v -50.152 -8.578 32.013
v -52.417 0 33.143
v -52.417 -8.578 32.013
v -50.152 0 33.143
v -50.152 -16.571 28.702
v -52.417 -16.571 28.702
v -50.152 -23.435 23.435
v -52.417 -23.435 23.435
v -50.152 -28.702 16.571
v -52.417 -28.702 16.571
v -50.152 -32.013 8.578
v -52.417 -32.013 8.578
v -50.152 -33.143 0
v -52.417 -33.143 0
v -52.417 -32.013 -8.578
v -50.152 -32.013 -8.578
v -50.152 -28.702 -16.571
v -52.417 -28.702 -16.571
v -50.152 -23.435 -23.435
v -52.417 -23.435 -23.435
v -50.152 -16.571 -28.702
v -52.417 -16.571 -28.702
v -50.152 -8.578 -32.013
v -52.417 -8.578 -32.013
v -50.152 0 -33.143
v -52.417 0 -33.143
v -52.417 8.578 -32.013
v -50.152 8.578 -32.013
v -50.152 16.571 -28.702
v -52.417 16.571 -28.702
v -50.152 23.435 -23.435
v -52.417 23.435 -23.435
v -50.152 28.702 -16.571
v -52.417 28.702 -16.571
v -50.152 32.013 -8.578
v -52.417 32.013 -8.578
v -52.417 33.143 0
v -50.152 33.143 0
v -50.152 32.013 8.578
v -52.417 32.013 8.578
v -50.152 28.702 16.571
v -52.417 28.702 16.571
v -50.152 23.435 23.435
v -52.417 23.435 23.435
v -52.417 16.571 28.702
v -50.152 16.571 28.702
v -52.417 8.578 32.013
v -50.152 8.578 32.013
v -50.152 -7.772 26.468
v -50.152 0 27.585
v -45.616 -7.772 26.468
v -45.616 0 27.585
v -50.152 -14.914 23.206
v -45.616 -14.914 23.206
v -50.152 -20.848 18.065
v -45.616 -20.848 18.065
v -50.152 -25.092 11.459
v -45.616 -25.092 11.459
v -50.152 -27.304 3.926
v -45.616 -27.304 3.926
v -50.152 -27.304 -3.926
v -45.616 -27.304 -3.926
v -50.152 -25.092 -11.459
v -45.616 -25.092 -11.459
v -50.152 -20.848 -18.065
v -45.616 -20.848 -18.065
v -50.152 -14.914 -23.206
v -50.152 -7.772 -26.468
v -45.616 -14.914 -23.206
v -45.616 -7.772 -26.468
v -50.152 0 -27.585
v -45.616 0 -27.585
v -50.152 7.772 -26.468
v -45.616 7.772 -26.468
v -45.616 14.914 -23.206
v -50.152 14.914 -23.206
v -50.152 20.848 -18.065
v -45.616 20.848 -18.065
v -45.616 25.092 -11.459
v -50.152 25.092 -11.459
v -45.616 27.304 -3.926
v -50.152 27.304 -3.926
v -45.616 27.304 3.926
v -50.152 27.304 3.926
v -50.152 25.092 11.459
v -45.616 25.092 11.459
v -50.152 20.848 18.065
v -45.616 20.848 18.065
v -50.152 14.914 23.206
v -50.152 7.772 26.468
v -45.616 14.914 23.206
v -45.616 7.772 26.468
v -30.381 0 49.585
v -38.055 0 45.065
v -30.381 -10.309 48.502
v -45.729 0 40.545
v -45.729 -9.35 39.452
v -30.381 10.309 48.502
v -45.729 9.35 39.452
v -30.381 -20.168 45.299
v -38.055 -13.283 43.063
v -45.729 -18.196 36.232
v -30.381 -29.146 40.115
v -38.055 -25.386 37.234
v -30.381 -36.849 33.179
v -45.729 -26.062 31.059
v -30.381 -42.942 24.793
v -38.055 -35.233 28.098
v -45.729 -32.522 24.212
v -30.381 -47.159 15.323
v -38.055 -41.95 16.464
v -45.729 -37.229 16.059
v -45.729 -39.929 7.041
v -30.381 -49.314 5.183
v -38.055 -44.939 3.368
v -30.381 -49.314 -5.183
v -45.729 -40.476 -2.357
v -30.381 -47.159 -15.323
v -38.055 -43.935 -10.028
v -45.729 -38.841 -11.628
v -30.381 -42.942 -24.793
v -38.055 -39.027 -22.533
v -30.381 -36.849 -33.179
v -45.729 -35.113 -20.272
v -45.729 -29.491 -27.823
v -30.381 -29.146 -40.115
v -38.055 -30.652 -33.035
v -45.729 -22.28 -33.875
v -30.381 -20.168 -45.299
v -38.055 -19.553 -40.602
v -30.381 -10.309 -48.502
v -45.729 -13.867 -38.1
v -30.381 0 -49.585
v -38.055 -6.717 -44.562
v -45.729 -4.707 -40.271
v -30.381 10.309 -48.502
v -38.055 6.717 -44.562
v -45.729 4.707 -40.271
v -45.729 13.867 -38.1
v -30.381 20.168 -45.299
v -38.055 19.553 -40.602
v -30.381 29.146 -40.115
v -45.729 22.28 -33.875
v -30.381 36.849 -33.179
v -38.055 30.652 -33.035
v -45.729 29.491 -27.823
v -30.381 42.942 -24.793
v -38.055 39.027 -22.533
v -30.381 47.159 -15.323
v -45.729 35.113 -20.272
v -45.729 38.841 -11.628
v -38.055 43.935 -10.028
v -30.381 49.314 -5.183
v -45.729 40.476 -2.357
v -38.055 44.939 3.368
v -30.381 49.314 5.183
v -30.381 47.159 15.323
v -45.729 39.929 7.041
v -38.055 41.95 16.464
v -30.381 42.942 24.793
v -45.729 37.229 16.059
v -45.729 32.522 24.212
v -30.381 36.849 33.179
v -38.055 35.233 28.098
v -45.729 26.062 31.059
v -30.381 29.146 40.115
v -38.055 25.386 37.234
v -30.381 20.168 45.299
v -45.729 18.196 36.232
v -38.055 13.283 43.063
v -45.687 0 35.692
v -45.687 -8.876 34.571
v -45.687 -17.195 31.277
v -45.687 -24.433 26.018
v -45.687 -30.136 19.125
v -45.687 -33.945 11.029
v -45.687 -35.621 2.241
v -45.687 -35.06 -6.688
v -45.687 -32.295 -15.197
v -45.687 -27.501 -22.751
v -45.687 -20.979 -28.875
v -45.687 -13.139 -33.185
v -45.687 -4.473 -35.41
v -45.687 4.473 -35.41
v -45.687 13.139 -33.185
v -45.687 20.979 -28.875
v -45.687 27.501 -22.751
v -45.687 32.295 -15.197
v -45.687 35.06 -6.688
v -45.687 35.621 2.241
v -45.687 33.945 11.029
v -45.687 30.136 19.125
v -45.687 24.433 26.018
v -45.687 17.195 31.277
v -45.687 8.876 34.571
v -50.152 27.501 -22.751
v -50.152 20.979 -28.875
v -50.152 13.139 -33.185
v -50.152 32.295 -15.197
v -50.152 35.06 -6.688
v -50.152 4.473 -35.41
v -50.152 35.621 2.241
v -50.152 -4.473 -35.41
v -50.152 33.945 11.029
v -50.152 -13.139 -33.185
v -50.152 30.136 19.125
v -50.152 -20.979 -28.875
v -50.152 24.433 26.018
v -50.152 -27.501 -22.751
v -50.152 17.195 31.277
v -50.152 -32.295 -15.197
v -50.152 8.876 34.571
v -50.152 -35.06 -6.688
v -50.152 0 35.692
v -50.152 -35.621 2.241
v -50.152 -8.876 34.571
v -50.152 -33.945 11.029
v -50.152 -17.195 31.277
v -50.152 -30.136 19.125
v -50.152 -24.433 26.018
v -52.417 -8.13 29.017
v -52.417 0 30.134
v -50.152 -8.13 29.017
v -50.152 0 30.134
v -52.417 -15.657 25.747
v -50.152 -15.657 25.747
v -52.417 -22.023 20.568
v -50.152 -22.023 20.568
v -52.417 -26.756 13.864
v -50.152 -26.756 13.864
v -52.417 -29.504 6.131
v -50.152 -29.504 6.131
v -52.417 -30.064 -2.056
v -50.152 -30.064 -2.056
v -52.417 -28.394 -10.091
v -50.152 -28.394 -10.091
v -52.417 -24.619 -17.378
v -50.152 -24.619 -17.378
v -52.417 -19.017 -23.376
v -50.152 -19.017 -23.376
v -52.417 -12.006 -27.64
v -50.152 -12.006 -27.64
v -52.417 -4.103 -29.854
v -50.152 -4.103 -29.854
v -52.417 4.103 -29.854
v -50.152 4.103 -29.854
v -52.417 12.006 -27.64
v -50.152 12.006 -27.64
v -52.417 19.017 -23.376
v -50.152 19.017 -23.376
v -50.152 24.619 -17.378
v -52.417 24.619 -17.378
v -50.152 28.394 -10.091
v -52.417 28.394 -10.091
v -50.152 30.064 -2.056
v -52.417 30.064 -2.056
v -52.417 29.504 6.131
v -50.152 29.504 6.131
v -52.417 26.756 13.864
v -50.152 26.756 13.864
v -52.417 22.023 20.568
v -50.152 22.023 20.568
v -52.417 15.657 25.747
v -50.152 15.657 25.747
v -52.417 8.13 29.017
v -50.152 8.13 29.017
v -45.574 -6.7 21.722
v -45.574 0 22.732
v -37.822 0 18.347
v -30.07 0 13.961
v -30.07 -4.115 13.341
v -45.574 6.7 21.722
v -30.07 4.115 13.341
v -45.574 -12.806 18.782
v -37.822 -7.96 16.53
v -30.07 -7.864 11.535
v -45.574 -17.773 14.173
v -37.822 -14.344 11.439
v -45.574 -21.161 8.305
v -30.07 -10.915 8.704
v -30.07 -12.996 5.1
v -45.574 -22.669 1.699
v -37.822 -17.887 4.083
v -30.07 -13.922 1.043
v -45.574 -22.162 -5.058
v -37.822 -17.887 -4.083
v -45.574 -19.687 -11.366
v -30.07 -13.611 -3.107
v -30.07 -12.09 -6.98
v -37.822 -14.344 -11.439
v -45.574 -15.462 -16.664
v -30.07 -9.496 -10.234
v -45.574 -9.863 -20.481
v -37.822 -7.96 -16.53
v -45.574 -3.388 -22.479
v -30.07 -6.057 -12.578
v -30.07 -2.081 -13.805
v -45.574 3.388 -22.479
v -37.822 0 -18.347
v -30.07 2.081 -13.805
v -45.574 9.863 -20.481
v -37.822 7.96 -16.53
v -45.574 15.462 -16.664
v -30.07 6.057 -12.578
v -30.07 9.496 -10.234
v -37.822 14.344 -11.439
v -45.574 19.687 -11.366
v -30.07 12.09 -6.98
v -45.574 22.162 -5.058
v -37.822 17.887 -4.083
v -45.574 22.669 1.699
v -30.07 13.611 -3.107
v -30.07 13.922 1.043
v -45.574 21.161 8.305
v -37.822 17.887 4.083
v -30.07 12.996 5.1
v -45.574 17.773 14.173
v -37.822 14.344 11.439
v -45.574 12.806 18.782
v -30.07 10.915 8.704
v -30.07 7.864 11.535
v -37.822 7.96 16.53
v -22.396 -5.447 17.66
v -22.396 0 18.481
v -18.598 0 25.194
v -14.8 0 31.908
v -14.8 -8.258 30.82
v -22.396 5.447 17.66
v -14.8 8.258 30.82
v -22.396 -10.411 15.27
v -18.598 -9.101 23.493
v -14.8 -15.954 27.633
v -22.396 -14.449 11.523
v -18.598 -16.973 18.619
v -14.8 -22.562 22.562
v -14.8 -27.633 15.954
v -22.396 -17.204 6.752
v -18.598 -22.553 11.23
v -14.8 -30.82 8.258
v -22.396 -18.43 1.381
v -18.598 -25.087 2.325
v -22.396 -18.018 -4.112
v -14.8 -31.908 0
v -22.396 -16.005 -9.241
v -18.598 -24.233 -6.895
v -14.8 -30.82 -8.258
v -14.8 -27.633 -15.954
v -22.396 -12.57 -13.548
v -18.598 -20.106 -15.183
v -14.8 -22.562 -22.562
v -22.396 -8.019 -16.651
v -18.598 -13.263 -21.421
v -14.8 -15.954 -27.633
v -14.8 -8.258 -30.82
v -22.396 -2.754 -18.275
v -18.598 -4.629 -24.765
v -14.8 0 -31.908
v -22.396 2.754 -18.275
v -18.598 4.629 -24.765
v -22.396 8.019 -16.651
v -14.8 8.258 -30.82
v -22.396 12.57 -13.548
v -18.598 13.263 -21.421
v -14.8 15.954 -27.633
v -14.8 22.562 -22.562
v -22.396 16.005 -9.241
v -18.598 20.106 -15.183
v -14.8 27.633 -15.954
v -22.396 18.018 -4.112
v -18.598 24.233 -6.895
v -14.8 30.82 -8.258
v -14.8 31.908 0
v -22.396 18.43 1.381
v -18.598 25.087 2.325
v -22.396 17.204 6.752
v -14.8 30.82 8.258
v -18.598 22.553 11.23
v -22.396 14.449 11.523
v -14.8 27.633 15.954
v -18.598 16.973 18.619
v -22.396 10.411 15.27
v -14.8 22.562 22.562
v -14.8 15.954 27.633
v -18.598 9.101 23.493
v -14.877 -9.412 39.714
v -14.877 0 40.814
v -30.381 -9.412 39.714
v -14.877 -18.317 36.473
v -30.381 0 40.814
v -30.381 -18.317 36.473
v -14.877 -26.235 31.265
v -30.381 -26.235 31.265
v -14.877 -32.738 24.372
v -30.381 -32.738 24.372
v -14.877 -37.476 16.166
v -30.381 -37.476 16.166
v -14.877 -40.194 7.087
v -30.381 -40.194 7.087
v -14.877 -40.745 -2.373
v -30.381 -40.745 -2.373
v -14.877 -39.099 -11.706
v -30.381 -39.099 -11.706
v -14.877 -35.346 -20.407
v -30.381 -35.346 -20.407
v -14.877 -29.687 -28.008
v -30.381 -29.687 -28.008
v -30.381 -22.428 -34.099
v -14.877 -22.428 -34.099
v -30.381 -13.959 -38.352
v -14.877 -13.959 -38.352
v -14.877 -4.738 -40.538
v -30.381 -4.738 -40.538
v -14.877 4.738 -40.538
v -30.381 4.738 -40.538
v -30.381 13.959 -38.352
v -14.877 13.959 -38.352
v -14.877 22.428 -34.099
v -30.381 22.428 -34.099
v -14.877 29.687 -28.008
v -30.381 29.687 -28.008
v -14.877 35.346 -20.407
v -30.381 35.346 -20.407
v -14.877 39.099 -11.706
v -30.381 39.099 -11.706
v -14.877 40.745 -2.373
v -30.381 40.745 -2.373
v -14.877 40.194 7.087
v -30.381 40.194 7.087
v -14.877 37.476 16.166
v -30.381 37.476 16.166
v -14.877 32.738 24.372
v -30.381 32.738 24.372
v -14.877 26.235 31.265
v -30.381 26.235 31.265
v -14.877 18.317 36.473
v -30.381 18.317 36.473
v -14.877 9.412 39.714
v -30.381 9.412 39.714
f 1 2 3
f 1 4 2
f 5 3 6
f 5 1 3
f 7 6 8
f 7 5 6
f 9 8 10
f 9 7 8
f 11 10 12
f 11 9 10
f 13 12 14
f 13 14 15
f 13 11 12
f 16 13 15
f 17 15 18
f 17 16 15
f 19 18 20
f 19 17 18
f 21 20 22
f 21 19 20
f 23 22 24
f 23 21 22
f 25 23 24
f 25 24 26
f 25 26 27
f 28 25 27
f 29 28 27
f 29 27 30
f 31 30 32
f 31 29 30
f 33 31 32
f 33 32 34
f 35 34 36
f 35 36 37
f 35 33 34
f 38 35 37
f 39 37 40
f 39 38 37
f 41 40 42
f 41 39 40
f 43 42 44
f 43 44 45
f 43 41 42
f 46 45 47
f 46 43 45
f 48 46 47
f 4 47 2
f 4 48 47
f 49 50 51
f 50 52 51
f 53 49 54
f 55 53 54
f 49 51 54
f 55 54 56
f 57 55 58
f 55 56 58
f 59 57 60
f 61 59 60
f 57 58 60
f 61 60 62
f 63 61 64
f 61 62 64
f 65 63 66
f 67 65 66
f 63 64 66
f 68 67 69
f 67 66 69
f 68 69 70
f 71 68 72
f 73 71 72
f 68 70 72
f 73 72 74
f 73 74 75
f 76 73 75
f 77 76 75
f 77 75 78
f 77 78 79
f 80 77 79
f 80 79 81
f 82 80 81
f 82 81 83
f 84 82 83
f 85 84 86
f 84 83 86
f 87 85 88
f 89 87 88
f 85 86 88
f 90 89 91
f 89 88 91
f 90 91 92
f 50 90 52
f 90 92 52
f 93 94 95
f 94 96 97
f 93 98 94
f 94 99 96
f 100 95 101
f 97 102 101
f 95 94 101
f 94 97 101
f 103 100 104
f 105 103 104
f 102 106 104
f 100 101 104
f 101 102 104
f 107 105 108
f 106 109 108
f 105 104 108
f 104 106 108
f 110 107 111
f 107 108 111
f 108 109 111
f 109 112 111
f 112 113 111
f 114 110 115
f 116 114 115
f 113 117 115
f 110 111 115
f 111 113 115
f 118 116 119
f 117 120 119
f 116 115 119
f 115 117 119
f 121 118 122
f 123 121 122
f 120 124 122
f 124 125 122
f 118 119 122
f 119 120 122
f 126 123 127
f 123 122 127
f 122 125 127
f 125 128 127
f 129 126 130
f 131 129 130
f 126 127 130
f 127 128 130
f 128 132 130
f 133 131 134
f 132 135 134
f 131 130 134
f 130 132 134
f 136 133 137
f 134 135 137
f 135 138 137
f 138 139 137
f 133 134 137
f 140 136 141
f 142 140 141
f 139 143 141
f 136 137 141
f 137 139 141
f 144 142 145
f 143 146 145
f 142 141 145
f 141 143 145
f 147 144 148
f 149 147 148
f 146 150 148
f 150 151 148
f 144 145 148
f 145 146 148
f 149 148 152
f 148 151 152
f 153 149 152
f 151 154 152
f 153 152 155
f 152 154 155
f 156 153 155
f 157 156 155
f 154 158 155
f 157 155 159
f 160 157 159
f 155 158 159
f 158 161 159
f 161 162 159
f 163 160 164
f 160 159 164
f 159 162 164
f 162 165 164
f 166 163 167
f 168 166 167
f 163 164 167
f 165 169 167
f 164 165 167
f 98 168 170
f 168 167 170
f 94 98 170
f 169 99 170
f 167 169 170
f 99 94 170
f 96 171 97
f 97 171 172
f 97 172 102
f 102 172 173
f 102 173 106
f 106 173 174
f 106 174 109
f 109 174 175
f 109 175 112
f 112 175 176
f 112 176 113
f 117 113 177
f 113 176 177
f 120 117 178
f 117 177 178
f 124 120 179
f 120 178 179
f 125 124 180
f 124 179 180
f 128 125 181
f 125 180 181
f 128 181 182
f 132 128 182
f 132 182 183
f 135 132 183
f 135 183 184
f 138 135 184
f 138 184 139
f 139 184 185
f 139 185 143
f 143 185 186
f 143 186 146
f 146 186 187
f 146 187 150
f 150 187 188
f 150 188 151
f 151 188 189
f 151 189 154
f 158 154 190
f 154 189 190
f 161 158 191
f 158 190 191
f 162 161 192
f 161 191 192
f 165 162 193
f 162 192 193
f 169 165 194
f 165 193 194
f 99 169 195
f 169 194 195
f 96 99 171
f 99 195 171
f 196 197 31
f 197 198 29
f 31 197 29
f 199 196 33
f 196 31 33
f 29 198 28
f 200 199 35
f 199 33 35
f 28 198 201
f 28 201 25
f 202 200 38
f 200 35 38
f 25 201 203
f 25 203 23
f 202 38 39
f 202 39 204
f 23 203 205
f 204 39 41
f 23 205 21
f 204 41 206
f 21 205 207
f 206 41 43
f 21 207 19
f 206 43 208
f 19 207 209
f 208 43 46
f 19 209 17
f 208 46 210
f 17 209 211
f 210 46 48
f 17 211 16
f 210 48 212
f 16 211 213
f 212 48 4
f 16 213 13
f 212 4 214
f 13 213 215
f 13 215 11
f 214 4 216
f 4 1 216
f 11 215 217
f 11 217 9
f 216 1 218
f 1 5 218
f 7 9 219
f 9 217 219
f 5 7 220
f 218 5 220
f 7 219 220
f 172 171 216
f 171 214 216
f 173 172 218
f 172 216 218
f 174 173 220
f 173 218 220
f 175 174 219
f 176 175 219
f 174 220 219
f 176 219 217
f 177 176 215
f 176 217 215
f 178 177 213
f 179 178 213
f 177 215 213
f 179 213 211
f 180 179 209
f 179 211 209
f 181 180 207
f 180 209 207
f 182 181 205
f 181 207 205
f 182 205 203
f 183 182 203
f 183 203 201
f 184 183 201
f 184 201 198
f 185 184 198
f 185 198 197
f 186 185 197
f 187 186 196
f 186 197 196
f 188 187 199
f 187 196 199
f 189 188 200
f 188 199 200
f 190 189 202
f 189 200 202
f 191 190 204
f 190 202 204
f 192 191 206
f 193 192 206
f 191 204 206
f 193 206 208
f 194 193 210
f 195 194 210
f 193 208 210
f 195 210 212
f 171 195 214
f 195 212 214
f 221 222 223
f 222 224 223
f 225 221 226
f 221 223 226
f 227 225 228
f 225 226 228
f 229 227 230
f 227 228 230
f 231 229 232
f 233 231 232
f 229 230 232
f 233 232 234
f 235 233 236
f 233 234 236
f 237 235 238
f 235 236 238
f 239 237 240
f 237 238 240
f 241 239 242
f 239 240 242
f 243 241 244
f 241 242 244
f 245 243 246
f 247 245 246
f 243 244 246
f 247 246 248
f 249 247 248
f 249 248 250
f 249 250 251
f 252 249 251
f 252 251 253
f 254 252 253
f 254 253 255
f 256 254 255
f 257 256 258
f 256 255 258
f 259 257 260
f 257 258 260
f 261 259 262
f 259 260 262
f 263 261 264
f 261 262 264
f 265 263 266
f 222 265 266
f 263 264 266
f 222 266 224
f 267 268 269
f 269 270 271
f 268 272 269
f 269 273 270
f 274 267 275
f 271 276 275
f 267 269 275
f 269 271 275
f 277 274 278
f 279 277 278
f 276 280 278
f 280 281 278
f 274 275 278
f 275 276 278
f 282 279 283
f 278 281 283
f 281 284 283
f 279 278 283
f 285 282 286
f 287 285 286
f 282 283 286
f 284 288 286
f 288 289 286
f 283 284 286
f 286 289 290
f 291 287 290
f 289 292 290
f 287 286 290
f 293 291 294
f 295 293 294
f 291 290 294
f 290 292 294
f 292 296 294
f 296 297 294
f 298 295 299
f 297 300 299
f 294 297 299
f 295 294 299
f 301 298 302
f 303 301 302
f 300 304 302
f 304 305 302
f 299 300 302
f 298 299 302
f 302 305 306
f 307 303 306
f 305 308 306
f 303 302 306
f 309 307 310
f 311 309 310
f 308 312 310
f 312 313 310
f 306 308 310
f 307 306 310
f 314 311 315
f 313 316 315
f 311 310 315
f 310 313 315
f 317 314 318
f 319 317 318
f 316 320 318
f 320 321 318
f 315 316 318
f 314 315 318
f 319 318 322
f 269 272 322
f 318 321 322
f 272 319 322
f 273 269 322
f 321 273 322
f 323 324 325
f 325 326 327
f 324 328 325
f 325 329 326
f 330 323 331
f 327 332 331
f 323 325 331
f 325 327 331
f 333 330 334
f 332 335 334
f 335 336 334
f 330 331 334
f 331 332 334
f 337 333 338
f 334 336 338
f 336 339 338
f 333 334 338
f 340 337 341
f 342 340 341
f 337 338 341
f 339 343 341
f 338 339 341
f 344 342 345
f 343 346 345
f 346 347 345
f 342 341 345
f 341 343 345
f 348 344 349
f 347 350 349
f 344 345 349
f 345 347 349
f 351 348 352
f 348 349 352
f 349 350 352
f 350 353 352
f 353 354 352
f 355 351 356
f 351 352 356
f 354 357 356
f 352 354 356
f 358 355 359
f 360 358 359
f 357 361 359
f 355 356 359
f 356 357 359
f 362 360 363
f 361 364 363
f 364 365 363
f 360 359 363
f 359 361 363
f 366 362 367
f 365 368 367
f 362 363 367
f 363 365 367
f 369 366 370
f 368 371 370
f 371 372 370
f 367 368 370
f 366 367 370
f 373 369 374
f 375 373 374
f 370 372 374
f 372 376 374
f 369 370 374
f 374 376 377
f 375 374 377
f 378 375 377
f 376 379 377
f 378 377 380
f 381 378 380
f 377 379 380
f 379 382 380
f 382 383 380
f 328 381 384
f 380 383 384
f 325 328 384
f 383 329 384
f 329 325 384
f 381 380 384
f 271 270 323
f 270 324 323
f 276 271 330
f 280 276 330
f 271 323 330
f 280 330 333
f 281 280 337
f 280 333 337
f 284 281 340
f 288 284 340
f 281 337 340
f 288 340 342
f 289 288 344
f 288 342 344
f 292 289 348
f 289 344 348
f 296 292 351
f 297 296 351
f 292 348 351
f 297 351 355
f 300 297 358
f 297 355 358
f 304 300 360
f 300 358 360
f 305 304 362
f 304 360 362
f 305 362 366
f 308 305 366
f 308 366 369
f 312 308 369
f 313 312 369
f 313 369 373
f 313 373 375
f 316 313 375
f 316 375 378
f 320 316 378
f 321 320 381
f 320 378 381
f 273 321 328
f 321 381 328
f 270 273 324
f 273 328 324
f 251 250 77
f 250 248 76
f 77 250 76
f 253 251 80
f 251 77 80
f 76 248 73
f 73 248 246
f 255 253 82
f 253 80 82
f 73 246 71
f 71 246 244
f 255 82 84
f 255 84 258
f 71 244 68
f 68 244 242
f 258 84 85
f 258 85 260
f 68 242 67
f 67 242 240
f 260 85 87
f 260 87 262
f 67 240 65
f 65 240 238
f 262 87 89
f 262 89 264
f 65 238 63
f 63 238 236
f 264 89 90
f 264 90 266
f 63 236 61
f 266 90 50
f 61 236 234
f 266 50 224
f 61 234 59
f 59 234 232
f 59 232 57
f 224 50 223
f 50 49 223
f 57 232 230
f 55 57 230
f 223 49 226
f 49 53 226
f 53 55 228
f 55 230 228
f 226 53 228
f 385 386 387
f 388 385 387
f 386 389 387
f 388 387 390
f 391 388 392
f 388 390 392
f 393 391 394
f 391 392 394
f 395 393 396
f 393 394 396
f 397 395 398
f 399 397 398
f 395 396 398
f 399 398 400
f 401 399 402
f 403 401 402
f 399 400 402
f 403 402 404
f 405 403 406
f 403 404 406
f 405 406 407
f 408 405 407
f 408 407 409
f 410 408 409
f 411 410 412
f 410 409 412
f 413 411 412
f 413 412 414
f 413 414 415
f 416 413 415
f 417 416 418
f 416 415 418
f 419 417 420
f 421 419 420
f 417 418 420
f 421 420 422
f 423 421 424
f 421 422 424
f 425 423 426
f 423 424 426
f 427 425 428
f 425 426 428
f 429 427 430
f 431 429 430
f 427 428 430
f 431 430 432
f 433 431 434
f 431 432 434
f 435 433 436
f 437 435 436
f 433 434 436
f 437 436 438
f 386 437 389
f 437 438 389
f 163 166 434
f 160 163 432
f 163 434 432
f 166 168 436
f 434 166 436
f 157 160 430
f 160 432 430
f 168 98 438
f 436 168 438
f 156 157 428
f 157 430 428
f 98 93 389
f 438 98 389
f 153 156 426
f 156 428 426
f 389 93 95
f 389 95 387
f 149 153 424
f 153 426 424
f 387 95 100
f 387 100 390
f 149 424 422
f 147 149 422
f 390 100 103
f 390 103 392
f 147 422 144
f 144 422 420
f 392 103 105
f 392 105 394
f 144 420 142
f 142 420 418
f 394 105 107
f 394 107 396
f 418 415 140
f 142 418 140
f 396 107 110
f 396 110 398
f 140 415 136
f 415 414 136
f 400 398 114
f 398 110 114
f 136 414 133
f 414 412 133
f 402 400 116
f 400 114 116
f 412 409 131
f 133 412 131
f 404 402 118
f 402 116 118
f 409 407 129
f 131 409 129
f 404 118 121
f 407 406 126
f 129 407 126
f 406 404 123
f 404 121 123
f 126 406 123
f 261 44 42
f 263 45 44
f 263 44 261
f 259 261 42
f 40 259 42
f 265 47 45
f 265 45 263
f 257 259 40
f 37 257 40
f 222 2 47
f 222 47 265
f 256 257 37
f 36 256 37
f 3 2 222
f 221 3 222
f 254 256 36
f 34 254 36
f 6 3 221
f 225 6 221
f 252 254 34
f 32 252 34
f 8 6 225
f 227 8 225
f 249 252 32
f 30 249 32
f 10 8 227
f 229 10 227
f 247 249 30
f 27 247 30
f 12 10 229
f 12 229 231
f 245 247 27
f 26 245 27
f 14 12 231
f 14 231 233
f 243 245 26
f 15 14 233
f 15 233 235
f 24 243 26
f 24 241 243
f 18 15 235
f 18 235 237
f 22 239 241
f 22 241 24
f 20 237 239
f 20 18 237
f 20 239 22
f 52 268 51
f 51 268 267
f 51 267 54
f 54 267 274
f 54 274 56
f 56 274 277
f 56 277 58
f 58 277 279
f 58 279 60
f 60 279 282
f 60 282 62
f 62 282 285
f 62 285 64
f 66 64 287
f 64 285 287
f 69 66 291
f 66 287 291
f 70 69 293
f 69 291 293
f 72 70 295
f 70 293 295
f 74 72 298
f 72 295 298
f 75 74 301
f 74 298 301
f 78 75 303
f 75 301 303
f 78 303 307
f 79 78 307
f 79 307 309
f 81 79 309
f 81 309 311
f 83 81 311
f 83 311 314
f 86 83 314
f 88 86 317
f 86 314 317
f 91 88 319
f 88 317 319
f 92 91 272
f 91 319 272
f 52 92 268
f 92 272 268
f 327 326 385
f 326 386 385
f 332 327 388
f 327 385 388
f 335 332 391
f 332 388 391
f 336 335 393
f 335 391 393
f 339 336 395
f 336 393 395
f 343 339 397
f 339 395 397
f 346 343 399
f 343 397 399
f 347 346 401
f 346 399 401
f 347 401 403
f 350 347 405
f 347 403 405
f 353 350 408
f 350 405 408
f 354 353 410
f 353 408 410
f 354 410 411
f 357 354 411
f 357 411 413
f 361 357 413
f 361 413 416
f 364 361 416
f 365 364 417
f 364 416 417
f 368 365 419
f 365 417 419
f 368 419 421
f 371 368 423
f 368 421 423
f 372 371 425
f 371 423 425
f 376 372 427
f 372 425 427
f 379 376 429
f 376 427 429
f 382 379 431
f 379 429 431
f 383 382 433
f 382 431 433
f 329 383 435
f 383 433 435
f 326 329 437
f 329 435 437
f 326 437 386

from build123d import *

# Parameters (mm, degrees)
F0_W = 2.2650395424
F0_H = 3.0083153293


with BuildPart() as f1:
    # F0 (on Front) → F1 (revolve)
    with BuildSketch(Plane.XZ):
        Polygon((-45.5736112406, 22.732421128), (-30.0700433831, 13.9608631497), (-22.3959553987, 18.4812154621), (-14.7995633587, 31.907699076), (-14.8772593031, 40.8138303776), (-30.3808271606, 40.8138303776), (-30.3808271606, 49.5853883559), (-45.7290031294, 40.5446837311), (-45.6866675821, 35.6918442891), (-41.150290519, 35.6918442891), (-41.150290519, 27.58526057), (-45.615946788, 27.58526057), align=None)
        Polygon((-50.1523238511, 27.58526057), (-45.615946788, 27.58526057), (-45.6866675821, 35.6918442891), (-50.1523238511, 35.6918442891), (-50.1523238511, 33.1427100942), (-47.8872843087, 33.1427100942), (-47.8872843087, 30.1343947649), (-50.1523238511, 30.1343947649), align=None)
        Polygon((-45.6866675821, 35.6918442891), (-45.615946788, 27.58526057), (-41.150290519, 27.58526057), (-41.150290519, 35.6918442891), align=None)
        with Locations((-51.2848436223, 31.6385524296)):
            Rectangle(F0_W, F0_H)
        with Locations((-49.0198040799, 31.6385524296)):
            Rectangle(F0_W, F0_H)
    revolve(axis=Axis((0.4552025348, 0, 0), (1, 0, 0)))


solid = f1.part
